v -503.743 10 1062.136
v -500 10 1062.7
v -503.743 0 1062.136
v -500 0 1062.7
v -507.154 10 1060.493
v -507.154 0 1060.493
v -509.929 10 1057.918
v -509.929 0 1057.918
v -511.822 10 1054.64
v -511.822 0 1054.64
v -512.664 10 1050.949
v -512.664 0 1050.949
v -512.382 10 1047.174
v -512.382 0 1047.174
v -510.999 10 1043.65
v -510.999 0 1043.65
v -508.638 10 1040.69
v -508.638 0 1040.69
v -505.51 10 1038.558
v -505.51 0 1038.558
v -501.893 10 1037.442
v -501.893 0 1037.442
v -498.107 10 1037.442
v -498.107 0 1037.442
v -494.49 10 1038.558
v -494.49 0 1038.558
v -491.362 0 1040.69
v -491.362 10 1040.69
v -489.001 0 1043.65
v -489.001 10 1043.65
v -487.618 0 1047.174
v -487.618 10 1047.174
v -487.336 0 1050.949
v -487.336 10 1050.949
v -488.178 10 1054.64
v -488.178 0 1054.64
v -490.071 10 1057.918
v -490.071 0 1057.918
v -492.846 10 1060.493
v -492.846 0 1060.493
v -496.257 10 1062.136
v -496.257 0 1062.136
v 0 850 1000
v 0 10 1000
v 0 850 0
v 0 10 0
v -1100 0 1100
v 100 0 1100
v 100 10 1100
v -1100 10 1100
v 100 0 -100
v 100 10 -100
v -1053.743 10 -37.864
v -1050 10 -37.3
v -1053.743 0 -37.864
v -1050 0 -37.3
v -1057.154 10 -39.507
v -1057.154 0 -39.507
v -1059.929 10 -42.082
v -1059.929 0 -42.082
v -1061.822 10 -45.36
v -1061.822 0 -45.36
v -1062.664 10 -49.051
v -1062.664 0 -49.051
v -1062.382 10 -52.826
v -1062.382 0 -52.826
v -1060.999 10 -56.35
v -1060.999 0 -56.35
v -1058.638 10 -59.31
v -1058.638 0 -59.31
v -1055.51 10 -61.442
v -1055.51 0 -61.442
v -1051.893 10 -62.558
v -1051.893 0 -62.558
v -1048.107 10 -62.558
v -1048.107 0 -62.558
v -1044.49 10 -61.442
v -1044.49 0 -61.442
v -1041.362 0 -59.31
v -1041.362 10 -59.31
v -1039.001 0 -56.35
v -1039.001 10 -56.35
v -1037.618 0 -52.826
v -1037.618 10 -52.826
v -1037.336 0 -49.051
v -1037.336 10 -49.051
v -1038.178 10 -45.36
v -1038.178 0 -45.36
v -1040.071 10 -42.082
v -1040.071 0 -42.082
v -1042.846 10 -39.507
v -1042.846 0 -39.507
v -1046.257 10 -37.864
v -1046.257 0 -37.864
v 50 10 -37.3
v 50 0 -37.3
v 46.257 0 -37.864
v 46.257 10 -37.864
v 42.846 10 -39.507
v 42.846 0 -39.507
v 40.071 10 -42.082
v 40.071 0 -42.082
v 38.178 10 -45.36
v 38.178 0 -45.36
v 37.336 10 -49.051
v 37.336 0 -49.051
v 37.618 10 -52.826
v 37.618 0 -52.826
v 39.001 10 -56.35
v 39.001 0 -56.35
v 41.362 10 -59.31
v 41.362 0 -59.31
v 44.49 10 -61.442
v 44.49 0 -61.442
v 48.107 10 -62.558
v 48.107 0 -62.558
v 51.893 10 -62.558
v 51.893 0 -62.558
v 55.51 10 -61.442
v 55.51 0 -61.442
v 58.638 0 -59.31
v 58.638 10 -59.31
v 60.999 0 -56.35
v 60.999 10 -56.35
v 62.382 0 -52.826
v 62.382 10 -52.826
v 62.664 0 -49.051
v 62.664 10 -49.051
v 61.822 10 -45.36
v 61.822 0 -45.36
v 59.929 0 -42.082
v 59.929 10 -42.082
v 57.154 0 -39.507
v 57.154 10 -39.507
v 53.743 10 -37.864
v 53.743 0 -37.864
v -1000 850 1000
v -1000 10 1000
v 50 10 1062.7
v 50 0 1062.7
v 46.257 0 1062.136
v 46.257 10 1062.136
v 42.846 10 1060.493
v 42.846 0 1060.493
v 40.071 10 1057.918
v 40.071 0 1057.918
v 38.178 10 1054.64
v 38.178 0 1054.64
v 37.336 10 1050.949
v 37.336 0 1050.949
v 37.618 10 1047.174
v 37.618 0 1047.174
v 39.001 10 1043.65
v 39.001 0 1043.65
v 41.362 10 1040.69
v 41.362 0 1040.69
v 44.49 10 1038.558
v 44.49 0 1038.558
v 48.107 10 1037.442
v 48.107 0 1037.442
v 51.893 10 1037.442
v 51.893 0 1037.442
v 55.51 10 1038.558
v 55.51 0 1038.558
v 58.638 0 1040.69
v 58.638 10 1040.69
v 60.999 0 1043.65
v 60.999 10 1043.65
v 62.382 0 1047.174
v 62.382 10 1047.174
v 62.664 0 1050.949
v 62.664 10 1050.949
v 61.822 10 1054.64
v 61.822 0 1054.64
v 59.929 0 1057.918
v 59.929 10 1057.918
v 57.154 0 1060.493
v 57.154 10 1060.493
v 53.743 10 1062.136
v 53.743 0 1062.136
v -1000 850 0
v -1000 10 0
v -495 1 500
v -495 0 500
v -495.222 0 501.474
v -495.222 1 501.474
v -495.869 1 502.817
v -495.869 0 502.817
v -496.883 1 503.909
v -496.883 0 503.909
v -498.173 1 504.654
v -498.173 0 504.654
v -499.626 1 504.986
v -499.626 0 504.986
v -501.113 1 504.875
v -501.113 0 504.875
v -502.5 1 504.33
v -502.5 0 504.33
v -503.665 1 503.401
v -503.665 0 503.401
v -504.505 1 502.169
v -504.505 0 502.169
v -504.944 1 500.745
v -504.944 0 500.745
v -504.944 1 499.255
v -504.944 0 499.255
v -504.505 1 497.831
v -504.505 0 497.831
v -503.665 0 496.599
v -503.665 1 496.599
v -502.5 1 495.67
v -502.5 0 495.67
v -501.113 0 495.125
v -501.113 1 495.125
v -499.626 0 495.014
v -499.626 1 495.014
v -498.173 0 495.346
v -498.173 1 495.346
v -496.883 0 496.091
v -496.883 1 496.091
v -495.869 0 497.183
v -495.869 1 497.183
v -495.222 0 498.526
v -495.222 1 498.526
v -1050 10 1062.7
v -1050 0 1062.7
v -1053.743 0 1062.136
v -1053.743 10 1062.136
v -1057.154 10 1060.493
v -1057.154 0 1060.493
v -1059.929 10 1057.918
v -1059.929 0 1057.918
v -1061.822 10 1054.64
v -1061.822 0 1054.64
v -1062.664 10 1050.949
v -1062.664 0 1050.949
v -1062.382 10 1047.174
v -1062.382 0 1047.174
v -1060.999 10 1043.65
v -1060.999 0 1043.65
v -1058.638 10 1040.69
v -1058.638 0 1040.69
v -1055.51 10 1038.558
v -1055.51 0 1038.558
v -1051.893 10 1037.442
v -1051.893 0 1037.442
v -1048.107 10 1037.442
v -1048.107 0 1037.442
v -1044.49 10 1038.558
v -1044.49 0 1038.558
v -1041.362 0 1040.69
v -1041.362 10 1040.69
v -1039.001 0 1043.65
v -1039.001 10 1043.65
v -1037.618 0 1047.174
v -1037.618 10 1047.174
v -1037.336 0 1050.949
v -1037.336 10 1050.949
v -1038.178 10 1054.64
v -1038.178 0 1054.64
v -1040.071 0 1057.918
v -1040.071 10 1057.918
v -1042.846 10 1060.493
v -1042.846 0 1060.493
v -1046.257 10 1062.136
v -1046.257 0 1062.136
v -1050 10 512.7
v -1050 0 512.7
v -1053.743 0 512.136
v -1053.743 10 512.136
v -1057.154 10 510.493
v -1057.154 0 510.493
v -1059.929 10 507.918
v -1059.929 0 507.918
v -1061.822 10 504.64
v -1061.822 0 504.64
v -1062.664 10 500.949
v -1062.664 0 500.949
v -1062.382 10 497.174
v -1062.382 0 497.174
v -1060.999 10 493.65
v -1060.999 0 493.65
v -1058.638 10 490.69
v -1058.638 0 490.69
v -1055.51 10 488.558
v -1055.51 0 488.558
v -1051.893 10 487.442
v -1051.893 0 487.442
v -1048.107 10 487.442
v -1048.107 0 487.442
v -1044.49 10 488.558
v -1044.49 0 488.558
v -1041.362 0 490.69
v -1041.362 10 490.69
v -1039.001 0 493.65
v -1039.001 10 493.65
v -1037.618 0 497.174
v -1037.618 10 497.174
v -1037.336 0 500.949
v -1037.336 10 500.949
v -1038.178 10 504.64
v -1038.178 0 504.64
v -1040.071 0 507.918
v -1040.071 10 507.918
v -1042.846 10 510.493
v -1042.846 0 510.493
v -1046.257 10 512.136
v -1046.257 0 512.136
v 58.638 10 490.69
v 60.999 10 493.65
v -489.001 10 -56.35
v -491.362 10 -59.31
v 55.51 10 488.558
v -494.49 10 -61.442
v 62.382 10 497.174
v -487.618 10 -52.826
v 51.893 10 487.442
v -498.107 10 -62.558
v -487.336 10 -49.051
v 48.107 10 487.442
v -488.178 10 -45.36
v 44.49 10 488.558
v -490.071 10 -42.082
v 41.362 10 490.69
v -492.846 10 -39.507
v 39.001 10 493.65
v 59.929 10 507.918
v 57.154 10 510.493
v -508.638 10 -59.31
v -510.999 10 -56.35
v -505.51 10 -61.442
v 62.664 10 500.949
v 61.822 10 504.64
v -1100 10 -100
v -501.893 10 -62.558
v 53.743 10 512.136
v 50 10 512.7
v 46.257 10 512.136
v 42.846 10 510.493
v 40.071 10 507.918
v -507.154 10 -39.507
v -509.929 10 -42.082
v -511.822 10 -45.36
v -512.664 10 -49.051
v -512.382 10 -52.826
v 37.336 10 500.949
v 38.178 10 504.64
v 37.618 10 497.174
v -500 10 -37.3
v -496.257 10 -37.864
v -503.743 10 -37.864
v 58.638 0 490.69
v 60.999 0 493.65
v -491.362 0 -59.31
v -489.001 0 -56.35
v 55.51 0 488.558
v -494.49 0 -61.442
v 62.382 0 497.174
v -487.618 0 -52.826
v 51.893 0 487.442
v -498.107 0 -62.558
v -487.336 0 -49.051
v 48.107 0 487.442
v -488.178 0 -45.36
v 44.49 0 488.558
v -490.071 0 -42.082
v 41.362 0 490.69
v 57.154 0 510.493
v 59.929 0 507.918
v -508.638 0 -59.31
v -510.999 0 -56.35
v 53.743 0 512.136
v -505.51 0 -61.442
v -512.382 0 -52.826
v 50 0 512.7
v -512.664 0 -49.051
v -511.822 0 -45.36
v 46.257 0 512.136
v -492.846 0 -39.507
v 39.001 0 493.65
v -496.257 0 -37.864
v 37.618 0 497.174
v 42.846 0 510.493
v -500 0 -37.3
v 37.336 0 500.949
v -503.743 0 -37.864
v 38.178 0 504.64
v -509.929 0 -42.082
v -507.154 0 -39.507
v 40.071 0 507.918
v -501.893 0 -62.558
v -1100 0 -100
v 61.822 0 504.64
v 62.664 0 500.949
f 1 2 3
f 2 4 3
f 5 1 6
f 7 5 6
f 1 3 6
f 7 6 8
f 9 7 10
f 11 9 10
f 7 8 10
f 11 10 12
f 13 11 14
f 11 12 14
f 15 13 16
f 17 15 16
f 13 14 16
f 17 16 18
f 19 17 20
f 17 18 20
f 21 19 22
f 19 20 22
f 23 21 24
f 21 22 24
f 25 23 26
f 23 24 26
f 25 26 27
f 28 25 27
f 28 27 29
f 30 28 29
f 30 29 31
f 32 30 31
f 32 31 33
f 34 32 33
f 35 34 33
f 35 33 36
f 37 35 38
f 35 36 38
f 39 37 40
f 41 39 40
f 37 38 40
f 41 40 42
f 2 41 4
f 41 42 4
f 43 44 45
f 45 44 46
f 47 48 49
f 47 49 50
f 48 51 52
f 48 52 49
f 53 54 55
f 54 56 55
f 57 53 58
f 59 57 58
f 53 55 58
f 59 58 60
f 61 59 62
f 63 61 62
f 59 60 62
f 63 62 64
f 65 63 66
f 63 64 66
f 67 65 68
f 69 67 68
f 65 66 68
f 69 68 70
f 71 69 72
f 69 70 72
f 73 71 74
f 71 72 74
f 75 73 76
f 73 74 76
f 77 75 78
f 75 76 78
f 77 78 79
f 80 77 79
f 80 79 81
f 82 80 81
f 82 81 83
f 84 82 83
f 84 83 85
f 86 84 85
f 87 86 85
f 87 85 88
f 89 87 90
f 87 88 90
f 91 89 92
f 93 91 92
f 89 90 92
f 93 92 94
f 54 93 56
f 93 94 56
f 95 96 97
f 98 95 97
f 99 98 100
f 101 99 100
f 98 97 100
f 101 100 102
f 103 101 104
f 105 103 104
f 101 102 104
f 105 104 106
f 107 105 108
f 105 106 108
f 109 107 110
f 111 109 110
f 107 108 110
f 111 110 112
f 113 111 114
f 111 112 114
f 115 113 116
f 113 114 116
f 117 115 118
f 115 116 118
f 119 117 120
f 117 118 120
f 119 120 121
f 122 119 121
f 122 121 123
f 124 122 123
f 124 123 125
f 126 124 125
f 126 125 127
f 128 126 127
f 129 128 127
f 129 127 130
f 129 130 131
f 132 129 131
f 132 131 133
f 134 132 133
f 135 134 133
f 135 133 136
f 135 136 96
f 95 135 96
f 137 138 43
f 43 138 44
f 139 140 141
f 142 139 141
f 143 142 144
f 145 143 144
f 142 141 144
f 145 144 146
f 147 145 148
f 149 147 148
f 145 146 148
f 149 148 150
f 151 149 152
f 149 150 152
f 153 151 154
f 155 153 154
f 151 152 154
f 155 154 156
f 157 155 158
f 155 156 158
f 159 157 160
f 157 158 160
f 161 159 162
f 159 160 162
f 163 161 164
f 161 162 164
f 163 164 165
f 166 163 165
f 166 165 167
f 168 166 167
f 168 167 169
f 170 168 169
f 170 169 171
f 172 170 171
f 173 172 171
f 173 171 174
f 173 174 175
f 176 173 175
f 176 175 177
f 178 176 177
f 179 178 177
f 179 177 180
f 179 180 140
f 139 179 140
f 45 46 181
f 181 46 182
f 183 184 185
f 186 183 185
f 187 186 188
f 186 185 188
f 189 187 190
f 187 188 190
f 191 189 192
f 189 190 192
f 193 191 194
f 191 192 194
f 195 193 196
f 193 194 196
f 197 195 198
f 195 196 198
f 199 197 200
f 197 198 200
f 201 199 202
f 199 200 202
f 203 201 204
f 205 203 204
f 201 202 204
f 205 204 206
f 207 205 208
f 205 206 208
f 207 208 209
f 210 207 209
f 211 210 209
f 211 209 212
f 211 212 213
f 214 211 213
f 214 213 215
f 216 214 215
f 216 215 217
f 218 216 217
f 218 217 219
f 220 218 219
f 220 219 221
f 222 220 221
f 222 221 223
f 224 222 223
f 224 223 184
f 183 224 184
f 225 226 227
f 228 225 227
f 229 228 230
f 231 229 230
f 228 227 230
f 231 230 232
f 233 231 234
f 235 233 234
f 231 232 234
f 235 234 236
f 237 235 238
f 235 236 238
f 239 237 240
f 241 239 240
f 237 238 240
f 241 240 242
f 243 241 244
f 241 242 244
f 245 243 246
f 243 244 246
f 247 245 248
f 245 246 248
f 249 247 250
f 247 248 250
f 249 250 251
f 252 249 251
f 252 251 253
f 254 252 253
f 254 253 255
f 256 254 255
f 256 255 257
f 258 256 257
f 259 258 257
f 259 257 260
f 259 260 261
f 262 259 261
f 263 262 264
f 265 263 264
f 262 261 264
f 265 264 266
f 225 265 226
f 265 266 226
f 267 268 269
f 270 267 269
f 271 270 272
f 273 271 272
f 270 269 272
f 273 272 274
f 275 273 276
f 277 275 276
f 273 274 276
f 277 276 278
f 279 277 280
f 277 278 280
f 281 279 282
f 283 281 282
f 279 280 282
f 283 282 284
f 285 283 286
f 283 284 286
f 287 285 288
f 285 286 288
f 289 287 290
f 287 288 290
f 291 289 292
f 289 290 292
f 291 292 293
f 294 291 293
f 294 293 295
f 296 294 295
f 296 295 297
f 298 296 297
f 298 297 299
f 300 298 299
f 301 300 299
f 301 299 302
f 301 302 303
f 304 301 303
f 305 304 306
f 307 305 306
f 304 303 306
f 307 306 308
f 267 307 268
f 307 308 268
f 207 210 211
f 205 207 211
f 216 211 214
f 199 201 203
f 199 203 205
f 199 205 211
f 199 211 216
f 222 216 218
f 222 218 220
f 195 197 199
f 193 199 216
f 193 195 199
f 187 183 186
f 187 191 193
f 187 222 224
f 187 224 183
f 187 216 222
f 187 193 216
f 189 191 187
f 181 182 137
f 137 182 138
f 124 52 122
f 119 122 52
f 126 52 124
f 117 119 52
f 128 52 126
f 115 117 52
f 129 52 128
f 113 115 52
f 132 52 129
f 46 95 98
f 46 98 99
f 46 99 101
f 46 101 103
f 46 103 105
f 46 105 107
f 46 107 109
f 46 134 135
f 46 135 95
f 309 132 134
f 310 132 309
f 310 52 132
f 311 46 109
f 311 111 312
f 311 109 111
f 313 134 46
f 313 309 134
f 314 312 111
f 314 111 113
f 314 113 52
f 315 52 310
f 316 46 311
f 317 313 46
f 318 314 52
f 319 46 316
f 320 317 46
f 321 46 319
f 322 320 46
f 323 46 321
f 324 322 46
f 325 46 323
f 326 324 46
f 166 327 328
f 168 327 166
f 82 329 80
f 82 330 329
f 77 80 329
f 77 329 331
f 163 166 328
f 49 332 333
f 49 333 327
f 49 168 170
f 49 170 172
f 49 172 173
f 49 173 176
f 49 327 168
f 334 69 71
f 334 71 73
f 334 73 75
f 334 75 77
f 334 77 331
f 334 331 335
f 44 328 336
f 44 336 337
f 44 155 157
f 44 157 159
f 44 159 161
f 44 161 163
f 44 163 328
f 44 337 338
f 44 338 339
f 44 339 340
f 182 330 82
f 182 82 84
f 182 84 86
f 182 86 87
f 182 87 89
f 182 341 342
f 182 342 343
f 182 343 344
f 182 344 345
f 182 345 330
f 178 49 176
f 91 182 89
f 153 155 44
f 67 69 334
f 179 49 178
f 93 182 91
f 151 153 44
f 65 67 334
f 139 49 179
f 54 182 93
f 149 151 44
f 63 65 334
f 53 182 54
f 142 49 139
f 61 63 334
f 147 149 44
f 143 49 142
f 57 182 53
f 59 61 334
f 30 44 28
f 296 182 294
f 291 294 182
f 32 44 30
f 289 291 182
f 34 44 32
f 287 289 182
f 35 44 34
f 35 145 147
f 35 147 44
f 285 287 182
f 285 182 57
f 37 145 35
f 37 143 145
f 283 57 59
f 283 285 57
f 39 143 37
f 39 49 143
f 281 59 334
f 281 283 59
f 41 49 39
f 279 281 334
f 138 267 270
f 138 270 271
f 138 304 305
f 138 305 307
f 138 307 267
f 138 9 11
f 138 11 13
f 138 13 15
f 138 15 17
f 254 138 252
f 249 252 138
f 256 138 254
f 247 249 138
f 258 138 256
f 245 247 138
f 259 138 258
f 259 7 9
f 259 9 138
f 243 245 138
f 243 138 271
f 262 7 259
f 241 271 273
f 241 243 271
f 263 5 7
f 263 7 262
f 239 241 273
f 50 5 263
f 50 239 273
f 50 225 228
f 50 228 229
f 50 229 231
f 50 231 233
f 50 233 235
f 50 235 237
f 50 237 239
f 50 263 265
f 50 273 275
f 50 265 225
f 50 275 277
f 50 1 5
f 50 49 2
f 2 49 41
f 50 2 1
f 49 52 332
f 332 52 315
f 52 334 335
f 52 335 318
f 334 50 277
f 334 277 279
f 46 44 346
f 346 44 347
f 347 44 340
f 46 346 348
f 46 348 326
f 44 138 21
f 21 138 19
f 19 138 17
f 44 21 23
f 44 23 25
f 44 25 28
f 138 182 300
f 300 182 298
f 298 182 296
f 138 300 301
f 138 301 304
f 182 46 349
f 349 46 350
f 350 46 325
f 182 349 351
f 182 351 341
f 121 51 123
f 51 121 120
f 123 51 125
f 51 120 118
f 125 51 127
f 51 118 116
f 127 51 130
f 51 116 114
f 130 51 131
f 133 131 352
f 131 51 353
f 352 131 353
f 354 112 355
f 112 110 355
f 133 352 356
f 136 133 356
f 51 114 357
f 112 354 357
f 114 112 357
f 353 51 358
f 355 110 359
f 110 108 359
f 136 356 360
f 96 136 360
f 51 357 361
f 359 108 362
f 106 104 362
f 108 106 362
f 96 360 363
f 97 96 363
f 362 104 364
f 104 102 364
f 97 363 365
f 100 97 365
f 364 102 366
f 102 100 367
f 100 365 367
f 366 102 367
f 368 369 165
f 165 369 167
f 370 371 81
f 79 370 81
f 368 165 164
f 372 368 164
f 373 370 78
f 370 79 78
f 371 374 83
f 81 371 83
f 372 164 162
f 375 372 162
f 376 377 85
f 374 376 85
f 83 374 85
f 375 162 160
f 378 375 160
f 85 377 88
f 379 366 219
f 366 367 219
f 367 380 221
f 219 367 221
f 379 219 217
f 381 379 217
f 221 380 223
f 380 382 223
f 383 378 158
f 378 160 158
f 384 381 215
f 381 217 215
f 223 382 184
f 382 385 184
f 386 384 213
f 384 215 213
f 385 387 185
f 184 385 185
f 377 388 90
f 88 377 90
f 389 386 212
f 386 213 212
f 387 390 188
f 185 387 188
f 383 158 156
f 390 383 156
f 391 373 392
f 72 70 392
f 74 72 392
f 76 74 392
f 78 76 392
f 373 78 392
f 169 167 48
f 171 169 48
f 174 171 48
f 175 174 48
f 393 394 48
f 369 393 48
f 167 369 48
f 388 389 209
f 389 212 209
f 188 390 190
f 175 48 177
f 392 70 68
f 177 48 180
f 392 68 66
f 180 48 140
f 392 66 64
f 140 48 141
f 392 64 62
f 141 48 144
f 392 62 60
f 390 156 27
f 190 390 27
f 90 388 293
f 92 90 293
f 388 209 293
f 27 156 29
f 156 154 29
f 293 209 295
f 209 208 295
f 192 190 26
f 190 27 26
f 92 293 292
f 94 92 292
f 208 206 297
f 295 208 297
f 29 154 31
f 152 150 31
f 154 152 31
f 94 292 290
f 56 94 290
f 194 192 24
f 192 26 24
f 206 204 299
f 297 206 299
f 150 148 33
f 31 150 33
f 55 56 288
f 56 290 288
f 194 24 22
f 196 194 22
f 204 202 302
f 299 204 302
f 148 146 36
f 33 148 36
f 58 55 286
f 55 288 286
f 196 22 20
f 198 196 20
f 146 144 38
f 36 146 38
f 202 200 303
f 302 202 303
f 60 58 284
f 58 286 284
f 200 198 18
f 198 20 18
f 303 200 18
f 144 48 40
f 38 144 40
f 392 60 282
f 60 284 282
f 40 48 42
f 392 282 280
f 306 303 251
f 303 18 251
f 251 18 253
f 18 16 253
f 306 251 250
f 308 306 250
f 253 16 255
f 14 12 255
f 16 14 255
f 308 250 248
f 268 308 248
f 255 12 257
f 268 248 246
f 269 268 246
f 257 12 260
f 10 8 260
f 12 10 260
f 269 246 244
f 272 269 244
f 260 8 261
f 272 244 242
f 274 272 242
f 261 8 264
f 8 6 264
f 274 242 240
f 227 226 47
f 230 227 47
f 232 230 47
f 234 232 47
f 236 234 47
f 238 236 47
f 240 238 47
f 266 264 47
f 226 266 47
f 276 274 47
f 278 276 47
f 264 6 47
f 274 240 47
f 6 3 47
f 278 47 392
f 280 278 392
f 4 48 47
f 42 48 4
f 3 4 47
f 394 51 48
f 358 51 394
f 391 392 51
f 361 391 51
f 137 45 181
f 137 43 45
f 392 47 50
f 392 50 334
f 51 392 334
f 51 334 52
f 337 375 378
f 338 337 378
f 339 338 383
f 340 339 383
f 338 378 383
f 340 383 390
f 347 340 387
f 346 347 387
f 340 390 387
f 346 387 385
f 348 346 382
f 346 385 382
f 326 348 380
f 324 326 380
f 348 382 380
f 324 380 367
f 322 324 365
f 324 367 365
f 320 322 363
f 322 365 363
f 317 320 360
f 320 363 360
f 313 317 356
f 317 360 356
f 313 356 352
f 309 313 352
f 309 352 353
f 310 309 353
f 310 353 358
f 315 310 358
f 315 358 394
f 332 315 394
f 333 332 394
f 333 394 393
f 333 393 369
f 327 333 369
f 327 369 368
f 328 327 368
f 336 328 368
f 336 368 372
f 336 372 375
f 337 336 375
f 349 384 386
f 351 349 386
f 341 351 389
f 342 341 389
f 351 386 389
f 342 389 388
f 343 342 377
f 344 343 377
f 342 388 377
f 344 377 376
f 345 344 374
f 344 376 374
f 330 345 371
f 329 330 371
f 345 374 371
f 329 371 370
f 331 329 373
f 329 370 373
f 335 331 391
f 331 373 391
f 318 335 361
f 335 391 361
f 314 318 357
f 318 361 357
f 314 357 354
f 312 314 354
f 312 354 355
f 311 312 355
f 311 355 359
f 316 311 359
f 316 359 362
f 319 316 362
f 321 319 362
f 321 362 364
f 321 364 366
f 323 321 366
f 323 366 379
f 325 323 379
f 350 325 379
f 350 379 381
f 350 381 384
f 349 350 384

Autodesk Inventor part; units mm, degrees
ref_plane "YZ Plane" through (0, 0, 0) normal (1, 0, 0) x (0, 1, 0)
ref_plane "XZ Plane" through (0, 0, 0) normal (0, 1, 0) x (-1, 0, 0)
ref_plane "XY Plane" through (0, 0, 0) normal (0, 0, 1) x (1, 0, 0)
sketch "Sketch1" plane through (0, 0, 0) normal (0, 1, 0) x (-1, 0, 0)
  line L0 (0, 0) -> (1000, 0)
  line L1 (1000, 0) -> (1000, 1000)
  line L2 (1000, 1000) -> (0, 1000)
  line L3 (0, 1000) -> (0, 0)
  line L4 (-100, 1100) -> (1100, 1100)
  line L5 (1100, 1100) -> (1100, -100)
  line L6 (1100, -100) -> (-100, -100)
  line L7 (-100, -100) -> (-100, 1100)
  dimension "d0" = 1000
  dimension "d1" = 1000
  dimension "d2" = 100
extrude "Extrusion1" add sketch "Sketch1" along normal blind 850 contours L3 L2 L1 L0
extrude "Extrusion2" add sketch "Sketch1" along normal blind 10
sketch "Sketch2" plane through (0, 10, 0) normal (0, 1, 0) x (1, 0, 0)
  line L0 (100, 100) -> (-1100, 100) projected
  line L1 (-1100, 100) -> (-1100, -1100) projected
  line L2 (-1100, -1100) -> (100, -1100) projected
  line L3 (100, -1100) -> (100, 100) projected
  line L4 (0, -1000) -> (0, 0) projected
  line L5 (-1000, -1000) -> (0, -1000) projected
  line L6 (-1000, 0) -> (-1000, -1000) projected
  line L7 (0, 0) -> (-1000, 0) projected
  line L8 (-1000, -1000) -> (-1050, -1000)
  line L9 (-1050, -1000) -> (-1050, -1050)
  line L10 (-1050, -1050) -> (50, -1050)
  line L11 (50, -1050) -> (50, 50)
  line L12 (50, 50) -> (-1050, 50)
  line L13 (-1050, 50) -> (-500, 50)
  line L14 (-500, 50) -> (-500, -1050)
  line L15 (50, 50) -> (50, -500)
  line L16 (50, -500) -> (-1000, -500)
  line L17 (-1000, -500) -> (-1050, -500)
  dimension "d7" = 50
  dimension "d8" = 50
  dimension "d9" = 1100
  dimension "d10" = 1100
  dimension "d11" = 550
hole "Hole1" at (-1050, 10, 1050) at (-500, 10, 1050) at (50, 10, 1050) at (50, 10, -50) at (-500, 10, -50) at (-1050, 10, -50) at (50, 10, 500) at (-1050, 10, 500) direction (0, -1, 0) diameter 25.4 end through all
sketch "Sketch3" plane through (0, 850, 1000) normal (1, 0, 0) x (0, 0, -1)
  line L0 (0, -59.4954) -> (1000, -59.4954) construction
  line L1 (1000, -59.4954) -> (1000, -749.3909) construction
  line L2 (1000, -749.3909) -> (0, -749.3909) construction
  line L3 (0, -749.3909) -> (0, -59.4954) construction
  point P0 (1000, -850)
decal "Decal1"
sketch "Sketch4" plane through (-1000, 850, 1000) normal (0, 0, 1) x (1, 0, 0)
  line L0 (0, -840) -> (0, 0) projected
  line L1 (0, -64.0631) -> (1000, -64.0631) construction
  line L2 (1000, -64.0631) -> (1000, -753.9585) construction
  line L3 (1000, -753.9585) -> (0, -753.9585) construction
  line L4 (0, -753.9585) -> (0, -64.0631) construction
  point P0 (1000, -850)
decal "Decal2"
sketch "Sketch5" plane through (-1000, 850, 0) normal (-1, 0, 0) x (0, 0, 1)
  line L0 (57.8435, -18.5187) -> (921.1484, -18.5187) construction
  line L1 (921.1484, -18.5187) -> (921.1484, -825.537) construction
  line L2 (921.1484, -825.537) -> (57.8435, -825.537) construction
  line L3 (57.8435, -825.537) -> (57.8435, -18.5187) construction
  point P0 (0, -850)
decal "Decal3"
sketch "Sketch6" plane through (0, 850, 0) normal (0, 0, -1) x (-1, 0, 0)
  line L0 (-2.3743, -103.2912) -> (997.1946, -103.2912) construction
  line L1 (997.1946, -103.2912) -> (997.1946, -725.2451) construction
  line L2 (997.1946, -725.2451) -> (-2.3743, -725.2451) construction
  line L3 (-2.3743, -725.2451) -> (-2.3743, -103.2912) construction
  point P0 (0, -850)
decal "Decal4"
sketch "Sketch7" plane through (0, 0, 0) normal (0, -1, 0) x (1, 0, 0)
  circle A0 centre (-1050, 500) radius 12.7 projected
  circle A1 centre (-500, 500) radius 5
  point P0 (0, 0)
  dimension "d73" = 10
extrude "Extrusion3" cut sketch "Sketch7" against normal blind 1 contours A1
